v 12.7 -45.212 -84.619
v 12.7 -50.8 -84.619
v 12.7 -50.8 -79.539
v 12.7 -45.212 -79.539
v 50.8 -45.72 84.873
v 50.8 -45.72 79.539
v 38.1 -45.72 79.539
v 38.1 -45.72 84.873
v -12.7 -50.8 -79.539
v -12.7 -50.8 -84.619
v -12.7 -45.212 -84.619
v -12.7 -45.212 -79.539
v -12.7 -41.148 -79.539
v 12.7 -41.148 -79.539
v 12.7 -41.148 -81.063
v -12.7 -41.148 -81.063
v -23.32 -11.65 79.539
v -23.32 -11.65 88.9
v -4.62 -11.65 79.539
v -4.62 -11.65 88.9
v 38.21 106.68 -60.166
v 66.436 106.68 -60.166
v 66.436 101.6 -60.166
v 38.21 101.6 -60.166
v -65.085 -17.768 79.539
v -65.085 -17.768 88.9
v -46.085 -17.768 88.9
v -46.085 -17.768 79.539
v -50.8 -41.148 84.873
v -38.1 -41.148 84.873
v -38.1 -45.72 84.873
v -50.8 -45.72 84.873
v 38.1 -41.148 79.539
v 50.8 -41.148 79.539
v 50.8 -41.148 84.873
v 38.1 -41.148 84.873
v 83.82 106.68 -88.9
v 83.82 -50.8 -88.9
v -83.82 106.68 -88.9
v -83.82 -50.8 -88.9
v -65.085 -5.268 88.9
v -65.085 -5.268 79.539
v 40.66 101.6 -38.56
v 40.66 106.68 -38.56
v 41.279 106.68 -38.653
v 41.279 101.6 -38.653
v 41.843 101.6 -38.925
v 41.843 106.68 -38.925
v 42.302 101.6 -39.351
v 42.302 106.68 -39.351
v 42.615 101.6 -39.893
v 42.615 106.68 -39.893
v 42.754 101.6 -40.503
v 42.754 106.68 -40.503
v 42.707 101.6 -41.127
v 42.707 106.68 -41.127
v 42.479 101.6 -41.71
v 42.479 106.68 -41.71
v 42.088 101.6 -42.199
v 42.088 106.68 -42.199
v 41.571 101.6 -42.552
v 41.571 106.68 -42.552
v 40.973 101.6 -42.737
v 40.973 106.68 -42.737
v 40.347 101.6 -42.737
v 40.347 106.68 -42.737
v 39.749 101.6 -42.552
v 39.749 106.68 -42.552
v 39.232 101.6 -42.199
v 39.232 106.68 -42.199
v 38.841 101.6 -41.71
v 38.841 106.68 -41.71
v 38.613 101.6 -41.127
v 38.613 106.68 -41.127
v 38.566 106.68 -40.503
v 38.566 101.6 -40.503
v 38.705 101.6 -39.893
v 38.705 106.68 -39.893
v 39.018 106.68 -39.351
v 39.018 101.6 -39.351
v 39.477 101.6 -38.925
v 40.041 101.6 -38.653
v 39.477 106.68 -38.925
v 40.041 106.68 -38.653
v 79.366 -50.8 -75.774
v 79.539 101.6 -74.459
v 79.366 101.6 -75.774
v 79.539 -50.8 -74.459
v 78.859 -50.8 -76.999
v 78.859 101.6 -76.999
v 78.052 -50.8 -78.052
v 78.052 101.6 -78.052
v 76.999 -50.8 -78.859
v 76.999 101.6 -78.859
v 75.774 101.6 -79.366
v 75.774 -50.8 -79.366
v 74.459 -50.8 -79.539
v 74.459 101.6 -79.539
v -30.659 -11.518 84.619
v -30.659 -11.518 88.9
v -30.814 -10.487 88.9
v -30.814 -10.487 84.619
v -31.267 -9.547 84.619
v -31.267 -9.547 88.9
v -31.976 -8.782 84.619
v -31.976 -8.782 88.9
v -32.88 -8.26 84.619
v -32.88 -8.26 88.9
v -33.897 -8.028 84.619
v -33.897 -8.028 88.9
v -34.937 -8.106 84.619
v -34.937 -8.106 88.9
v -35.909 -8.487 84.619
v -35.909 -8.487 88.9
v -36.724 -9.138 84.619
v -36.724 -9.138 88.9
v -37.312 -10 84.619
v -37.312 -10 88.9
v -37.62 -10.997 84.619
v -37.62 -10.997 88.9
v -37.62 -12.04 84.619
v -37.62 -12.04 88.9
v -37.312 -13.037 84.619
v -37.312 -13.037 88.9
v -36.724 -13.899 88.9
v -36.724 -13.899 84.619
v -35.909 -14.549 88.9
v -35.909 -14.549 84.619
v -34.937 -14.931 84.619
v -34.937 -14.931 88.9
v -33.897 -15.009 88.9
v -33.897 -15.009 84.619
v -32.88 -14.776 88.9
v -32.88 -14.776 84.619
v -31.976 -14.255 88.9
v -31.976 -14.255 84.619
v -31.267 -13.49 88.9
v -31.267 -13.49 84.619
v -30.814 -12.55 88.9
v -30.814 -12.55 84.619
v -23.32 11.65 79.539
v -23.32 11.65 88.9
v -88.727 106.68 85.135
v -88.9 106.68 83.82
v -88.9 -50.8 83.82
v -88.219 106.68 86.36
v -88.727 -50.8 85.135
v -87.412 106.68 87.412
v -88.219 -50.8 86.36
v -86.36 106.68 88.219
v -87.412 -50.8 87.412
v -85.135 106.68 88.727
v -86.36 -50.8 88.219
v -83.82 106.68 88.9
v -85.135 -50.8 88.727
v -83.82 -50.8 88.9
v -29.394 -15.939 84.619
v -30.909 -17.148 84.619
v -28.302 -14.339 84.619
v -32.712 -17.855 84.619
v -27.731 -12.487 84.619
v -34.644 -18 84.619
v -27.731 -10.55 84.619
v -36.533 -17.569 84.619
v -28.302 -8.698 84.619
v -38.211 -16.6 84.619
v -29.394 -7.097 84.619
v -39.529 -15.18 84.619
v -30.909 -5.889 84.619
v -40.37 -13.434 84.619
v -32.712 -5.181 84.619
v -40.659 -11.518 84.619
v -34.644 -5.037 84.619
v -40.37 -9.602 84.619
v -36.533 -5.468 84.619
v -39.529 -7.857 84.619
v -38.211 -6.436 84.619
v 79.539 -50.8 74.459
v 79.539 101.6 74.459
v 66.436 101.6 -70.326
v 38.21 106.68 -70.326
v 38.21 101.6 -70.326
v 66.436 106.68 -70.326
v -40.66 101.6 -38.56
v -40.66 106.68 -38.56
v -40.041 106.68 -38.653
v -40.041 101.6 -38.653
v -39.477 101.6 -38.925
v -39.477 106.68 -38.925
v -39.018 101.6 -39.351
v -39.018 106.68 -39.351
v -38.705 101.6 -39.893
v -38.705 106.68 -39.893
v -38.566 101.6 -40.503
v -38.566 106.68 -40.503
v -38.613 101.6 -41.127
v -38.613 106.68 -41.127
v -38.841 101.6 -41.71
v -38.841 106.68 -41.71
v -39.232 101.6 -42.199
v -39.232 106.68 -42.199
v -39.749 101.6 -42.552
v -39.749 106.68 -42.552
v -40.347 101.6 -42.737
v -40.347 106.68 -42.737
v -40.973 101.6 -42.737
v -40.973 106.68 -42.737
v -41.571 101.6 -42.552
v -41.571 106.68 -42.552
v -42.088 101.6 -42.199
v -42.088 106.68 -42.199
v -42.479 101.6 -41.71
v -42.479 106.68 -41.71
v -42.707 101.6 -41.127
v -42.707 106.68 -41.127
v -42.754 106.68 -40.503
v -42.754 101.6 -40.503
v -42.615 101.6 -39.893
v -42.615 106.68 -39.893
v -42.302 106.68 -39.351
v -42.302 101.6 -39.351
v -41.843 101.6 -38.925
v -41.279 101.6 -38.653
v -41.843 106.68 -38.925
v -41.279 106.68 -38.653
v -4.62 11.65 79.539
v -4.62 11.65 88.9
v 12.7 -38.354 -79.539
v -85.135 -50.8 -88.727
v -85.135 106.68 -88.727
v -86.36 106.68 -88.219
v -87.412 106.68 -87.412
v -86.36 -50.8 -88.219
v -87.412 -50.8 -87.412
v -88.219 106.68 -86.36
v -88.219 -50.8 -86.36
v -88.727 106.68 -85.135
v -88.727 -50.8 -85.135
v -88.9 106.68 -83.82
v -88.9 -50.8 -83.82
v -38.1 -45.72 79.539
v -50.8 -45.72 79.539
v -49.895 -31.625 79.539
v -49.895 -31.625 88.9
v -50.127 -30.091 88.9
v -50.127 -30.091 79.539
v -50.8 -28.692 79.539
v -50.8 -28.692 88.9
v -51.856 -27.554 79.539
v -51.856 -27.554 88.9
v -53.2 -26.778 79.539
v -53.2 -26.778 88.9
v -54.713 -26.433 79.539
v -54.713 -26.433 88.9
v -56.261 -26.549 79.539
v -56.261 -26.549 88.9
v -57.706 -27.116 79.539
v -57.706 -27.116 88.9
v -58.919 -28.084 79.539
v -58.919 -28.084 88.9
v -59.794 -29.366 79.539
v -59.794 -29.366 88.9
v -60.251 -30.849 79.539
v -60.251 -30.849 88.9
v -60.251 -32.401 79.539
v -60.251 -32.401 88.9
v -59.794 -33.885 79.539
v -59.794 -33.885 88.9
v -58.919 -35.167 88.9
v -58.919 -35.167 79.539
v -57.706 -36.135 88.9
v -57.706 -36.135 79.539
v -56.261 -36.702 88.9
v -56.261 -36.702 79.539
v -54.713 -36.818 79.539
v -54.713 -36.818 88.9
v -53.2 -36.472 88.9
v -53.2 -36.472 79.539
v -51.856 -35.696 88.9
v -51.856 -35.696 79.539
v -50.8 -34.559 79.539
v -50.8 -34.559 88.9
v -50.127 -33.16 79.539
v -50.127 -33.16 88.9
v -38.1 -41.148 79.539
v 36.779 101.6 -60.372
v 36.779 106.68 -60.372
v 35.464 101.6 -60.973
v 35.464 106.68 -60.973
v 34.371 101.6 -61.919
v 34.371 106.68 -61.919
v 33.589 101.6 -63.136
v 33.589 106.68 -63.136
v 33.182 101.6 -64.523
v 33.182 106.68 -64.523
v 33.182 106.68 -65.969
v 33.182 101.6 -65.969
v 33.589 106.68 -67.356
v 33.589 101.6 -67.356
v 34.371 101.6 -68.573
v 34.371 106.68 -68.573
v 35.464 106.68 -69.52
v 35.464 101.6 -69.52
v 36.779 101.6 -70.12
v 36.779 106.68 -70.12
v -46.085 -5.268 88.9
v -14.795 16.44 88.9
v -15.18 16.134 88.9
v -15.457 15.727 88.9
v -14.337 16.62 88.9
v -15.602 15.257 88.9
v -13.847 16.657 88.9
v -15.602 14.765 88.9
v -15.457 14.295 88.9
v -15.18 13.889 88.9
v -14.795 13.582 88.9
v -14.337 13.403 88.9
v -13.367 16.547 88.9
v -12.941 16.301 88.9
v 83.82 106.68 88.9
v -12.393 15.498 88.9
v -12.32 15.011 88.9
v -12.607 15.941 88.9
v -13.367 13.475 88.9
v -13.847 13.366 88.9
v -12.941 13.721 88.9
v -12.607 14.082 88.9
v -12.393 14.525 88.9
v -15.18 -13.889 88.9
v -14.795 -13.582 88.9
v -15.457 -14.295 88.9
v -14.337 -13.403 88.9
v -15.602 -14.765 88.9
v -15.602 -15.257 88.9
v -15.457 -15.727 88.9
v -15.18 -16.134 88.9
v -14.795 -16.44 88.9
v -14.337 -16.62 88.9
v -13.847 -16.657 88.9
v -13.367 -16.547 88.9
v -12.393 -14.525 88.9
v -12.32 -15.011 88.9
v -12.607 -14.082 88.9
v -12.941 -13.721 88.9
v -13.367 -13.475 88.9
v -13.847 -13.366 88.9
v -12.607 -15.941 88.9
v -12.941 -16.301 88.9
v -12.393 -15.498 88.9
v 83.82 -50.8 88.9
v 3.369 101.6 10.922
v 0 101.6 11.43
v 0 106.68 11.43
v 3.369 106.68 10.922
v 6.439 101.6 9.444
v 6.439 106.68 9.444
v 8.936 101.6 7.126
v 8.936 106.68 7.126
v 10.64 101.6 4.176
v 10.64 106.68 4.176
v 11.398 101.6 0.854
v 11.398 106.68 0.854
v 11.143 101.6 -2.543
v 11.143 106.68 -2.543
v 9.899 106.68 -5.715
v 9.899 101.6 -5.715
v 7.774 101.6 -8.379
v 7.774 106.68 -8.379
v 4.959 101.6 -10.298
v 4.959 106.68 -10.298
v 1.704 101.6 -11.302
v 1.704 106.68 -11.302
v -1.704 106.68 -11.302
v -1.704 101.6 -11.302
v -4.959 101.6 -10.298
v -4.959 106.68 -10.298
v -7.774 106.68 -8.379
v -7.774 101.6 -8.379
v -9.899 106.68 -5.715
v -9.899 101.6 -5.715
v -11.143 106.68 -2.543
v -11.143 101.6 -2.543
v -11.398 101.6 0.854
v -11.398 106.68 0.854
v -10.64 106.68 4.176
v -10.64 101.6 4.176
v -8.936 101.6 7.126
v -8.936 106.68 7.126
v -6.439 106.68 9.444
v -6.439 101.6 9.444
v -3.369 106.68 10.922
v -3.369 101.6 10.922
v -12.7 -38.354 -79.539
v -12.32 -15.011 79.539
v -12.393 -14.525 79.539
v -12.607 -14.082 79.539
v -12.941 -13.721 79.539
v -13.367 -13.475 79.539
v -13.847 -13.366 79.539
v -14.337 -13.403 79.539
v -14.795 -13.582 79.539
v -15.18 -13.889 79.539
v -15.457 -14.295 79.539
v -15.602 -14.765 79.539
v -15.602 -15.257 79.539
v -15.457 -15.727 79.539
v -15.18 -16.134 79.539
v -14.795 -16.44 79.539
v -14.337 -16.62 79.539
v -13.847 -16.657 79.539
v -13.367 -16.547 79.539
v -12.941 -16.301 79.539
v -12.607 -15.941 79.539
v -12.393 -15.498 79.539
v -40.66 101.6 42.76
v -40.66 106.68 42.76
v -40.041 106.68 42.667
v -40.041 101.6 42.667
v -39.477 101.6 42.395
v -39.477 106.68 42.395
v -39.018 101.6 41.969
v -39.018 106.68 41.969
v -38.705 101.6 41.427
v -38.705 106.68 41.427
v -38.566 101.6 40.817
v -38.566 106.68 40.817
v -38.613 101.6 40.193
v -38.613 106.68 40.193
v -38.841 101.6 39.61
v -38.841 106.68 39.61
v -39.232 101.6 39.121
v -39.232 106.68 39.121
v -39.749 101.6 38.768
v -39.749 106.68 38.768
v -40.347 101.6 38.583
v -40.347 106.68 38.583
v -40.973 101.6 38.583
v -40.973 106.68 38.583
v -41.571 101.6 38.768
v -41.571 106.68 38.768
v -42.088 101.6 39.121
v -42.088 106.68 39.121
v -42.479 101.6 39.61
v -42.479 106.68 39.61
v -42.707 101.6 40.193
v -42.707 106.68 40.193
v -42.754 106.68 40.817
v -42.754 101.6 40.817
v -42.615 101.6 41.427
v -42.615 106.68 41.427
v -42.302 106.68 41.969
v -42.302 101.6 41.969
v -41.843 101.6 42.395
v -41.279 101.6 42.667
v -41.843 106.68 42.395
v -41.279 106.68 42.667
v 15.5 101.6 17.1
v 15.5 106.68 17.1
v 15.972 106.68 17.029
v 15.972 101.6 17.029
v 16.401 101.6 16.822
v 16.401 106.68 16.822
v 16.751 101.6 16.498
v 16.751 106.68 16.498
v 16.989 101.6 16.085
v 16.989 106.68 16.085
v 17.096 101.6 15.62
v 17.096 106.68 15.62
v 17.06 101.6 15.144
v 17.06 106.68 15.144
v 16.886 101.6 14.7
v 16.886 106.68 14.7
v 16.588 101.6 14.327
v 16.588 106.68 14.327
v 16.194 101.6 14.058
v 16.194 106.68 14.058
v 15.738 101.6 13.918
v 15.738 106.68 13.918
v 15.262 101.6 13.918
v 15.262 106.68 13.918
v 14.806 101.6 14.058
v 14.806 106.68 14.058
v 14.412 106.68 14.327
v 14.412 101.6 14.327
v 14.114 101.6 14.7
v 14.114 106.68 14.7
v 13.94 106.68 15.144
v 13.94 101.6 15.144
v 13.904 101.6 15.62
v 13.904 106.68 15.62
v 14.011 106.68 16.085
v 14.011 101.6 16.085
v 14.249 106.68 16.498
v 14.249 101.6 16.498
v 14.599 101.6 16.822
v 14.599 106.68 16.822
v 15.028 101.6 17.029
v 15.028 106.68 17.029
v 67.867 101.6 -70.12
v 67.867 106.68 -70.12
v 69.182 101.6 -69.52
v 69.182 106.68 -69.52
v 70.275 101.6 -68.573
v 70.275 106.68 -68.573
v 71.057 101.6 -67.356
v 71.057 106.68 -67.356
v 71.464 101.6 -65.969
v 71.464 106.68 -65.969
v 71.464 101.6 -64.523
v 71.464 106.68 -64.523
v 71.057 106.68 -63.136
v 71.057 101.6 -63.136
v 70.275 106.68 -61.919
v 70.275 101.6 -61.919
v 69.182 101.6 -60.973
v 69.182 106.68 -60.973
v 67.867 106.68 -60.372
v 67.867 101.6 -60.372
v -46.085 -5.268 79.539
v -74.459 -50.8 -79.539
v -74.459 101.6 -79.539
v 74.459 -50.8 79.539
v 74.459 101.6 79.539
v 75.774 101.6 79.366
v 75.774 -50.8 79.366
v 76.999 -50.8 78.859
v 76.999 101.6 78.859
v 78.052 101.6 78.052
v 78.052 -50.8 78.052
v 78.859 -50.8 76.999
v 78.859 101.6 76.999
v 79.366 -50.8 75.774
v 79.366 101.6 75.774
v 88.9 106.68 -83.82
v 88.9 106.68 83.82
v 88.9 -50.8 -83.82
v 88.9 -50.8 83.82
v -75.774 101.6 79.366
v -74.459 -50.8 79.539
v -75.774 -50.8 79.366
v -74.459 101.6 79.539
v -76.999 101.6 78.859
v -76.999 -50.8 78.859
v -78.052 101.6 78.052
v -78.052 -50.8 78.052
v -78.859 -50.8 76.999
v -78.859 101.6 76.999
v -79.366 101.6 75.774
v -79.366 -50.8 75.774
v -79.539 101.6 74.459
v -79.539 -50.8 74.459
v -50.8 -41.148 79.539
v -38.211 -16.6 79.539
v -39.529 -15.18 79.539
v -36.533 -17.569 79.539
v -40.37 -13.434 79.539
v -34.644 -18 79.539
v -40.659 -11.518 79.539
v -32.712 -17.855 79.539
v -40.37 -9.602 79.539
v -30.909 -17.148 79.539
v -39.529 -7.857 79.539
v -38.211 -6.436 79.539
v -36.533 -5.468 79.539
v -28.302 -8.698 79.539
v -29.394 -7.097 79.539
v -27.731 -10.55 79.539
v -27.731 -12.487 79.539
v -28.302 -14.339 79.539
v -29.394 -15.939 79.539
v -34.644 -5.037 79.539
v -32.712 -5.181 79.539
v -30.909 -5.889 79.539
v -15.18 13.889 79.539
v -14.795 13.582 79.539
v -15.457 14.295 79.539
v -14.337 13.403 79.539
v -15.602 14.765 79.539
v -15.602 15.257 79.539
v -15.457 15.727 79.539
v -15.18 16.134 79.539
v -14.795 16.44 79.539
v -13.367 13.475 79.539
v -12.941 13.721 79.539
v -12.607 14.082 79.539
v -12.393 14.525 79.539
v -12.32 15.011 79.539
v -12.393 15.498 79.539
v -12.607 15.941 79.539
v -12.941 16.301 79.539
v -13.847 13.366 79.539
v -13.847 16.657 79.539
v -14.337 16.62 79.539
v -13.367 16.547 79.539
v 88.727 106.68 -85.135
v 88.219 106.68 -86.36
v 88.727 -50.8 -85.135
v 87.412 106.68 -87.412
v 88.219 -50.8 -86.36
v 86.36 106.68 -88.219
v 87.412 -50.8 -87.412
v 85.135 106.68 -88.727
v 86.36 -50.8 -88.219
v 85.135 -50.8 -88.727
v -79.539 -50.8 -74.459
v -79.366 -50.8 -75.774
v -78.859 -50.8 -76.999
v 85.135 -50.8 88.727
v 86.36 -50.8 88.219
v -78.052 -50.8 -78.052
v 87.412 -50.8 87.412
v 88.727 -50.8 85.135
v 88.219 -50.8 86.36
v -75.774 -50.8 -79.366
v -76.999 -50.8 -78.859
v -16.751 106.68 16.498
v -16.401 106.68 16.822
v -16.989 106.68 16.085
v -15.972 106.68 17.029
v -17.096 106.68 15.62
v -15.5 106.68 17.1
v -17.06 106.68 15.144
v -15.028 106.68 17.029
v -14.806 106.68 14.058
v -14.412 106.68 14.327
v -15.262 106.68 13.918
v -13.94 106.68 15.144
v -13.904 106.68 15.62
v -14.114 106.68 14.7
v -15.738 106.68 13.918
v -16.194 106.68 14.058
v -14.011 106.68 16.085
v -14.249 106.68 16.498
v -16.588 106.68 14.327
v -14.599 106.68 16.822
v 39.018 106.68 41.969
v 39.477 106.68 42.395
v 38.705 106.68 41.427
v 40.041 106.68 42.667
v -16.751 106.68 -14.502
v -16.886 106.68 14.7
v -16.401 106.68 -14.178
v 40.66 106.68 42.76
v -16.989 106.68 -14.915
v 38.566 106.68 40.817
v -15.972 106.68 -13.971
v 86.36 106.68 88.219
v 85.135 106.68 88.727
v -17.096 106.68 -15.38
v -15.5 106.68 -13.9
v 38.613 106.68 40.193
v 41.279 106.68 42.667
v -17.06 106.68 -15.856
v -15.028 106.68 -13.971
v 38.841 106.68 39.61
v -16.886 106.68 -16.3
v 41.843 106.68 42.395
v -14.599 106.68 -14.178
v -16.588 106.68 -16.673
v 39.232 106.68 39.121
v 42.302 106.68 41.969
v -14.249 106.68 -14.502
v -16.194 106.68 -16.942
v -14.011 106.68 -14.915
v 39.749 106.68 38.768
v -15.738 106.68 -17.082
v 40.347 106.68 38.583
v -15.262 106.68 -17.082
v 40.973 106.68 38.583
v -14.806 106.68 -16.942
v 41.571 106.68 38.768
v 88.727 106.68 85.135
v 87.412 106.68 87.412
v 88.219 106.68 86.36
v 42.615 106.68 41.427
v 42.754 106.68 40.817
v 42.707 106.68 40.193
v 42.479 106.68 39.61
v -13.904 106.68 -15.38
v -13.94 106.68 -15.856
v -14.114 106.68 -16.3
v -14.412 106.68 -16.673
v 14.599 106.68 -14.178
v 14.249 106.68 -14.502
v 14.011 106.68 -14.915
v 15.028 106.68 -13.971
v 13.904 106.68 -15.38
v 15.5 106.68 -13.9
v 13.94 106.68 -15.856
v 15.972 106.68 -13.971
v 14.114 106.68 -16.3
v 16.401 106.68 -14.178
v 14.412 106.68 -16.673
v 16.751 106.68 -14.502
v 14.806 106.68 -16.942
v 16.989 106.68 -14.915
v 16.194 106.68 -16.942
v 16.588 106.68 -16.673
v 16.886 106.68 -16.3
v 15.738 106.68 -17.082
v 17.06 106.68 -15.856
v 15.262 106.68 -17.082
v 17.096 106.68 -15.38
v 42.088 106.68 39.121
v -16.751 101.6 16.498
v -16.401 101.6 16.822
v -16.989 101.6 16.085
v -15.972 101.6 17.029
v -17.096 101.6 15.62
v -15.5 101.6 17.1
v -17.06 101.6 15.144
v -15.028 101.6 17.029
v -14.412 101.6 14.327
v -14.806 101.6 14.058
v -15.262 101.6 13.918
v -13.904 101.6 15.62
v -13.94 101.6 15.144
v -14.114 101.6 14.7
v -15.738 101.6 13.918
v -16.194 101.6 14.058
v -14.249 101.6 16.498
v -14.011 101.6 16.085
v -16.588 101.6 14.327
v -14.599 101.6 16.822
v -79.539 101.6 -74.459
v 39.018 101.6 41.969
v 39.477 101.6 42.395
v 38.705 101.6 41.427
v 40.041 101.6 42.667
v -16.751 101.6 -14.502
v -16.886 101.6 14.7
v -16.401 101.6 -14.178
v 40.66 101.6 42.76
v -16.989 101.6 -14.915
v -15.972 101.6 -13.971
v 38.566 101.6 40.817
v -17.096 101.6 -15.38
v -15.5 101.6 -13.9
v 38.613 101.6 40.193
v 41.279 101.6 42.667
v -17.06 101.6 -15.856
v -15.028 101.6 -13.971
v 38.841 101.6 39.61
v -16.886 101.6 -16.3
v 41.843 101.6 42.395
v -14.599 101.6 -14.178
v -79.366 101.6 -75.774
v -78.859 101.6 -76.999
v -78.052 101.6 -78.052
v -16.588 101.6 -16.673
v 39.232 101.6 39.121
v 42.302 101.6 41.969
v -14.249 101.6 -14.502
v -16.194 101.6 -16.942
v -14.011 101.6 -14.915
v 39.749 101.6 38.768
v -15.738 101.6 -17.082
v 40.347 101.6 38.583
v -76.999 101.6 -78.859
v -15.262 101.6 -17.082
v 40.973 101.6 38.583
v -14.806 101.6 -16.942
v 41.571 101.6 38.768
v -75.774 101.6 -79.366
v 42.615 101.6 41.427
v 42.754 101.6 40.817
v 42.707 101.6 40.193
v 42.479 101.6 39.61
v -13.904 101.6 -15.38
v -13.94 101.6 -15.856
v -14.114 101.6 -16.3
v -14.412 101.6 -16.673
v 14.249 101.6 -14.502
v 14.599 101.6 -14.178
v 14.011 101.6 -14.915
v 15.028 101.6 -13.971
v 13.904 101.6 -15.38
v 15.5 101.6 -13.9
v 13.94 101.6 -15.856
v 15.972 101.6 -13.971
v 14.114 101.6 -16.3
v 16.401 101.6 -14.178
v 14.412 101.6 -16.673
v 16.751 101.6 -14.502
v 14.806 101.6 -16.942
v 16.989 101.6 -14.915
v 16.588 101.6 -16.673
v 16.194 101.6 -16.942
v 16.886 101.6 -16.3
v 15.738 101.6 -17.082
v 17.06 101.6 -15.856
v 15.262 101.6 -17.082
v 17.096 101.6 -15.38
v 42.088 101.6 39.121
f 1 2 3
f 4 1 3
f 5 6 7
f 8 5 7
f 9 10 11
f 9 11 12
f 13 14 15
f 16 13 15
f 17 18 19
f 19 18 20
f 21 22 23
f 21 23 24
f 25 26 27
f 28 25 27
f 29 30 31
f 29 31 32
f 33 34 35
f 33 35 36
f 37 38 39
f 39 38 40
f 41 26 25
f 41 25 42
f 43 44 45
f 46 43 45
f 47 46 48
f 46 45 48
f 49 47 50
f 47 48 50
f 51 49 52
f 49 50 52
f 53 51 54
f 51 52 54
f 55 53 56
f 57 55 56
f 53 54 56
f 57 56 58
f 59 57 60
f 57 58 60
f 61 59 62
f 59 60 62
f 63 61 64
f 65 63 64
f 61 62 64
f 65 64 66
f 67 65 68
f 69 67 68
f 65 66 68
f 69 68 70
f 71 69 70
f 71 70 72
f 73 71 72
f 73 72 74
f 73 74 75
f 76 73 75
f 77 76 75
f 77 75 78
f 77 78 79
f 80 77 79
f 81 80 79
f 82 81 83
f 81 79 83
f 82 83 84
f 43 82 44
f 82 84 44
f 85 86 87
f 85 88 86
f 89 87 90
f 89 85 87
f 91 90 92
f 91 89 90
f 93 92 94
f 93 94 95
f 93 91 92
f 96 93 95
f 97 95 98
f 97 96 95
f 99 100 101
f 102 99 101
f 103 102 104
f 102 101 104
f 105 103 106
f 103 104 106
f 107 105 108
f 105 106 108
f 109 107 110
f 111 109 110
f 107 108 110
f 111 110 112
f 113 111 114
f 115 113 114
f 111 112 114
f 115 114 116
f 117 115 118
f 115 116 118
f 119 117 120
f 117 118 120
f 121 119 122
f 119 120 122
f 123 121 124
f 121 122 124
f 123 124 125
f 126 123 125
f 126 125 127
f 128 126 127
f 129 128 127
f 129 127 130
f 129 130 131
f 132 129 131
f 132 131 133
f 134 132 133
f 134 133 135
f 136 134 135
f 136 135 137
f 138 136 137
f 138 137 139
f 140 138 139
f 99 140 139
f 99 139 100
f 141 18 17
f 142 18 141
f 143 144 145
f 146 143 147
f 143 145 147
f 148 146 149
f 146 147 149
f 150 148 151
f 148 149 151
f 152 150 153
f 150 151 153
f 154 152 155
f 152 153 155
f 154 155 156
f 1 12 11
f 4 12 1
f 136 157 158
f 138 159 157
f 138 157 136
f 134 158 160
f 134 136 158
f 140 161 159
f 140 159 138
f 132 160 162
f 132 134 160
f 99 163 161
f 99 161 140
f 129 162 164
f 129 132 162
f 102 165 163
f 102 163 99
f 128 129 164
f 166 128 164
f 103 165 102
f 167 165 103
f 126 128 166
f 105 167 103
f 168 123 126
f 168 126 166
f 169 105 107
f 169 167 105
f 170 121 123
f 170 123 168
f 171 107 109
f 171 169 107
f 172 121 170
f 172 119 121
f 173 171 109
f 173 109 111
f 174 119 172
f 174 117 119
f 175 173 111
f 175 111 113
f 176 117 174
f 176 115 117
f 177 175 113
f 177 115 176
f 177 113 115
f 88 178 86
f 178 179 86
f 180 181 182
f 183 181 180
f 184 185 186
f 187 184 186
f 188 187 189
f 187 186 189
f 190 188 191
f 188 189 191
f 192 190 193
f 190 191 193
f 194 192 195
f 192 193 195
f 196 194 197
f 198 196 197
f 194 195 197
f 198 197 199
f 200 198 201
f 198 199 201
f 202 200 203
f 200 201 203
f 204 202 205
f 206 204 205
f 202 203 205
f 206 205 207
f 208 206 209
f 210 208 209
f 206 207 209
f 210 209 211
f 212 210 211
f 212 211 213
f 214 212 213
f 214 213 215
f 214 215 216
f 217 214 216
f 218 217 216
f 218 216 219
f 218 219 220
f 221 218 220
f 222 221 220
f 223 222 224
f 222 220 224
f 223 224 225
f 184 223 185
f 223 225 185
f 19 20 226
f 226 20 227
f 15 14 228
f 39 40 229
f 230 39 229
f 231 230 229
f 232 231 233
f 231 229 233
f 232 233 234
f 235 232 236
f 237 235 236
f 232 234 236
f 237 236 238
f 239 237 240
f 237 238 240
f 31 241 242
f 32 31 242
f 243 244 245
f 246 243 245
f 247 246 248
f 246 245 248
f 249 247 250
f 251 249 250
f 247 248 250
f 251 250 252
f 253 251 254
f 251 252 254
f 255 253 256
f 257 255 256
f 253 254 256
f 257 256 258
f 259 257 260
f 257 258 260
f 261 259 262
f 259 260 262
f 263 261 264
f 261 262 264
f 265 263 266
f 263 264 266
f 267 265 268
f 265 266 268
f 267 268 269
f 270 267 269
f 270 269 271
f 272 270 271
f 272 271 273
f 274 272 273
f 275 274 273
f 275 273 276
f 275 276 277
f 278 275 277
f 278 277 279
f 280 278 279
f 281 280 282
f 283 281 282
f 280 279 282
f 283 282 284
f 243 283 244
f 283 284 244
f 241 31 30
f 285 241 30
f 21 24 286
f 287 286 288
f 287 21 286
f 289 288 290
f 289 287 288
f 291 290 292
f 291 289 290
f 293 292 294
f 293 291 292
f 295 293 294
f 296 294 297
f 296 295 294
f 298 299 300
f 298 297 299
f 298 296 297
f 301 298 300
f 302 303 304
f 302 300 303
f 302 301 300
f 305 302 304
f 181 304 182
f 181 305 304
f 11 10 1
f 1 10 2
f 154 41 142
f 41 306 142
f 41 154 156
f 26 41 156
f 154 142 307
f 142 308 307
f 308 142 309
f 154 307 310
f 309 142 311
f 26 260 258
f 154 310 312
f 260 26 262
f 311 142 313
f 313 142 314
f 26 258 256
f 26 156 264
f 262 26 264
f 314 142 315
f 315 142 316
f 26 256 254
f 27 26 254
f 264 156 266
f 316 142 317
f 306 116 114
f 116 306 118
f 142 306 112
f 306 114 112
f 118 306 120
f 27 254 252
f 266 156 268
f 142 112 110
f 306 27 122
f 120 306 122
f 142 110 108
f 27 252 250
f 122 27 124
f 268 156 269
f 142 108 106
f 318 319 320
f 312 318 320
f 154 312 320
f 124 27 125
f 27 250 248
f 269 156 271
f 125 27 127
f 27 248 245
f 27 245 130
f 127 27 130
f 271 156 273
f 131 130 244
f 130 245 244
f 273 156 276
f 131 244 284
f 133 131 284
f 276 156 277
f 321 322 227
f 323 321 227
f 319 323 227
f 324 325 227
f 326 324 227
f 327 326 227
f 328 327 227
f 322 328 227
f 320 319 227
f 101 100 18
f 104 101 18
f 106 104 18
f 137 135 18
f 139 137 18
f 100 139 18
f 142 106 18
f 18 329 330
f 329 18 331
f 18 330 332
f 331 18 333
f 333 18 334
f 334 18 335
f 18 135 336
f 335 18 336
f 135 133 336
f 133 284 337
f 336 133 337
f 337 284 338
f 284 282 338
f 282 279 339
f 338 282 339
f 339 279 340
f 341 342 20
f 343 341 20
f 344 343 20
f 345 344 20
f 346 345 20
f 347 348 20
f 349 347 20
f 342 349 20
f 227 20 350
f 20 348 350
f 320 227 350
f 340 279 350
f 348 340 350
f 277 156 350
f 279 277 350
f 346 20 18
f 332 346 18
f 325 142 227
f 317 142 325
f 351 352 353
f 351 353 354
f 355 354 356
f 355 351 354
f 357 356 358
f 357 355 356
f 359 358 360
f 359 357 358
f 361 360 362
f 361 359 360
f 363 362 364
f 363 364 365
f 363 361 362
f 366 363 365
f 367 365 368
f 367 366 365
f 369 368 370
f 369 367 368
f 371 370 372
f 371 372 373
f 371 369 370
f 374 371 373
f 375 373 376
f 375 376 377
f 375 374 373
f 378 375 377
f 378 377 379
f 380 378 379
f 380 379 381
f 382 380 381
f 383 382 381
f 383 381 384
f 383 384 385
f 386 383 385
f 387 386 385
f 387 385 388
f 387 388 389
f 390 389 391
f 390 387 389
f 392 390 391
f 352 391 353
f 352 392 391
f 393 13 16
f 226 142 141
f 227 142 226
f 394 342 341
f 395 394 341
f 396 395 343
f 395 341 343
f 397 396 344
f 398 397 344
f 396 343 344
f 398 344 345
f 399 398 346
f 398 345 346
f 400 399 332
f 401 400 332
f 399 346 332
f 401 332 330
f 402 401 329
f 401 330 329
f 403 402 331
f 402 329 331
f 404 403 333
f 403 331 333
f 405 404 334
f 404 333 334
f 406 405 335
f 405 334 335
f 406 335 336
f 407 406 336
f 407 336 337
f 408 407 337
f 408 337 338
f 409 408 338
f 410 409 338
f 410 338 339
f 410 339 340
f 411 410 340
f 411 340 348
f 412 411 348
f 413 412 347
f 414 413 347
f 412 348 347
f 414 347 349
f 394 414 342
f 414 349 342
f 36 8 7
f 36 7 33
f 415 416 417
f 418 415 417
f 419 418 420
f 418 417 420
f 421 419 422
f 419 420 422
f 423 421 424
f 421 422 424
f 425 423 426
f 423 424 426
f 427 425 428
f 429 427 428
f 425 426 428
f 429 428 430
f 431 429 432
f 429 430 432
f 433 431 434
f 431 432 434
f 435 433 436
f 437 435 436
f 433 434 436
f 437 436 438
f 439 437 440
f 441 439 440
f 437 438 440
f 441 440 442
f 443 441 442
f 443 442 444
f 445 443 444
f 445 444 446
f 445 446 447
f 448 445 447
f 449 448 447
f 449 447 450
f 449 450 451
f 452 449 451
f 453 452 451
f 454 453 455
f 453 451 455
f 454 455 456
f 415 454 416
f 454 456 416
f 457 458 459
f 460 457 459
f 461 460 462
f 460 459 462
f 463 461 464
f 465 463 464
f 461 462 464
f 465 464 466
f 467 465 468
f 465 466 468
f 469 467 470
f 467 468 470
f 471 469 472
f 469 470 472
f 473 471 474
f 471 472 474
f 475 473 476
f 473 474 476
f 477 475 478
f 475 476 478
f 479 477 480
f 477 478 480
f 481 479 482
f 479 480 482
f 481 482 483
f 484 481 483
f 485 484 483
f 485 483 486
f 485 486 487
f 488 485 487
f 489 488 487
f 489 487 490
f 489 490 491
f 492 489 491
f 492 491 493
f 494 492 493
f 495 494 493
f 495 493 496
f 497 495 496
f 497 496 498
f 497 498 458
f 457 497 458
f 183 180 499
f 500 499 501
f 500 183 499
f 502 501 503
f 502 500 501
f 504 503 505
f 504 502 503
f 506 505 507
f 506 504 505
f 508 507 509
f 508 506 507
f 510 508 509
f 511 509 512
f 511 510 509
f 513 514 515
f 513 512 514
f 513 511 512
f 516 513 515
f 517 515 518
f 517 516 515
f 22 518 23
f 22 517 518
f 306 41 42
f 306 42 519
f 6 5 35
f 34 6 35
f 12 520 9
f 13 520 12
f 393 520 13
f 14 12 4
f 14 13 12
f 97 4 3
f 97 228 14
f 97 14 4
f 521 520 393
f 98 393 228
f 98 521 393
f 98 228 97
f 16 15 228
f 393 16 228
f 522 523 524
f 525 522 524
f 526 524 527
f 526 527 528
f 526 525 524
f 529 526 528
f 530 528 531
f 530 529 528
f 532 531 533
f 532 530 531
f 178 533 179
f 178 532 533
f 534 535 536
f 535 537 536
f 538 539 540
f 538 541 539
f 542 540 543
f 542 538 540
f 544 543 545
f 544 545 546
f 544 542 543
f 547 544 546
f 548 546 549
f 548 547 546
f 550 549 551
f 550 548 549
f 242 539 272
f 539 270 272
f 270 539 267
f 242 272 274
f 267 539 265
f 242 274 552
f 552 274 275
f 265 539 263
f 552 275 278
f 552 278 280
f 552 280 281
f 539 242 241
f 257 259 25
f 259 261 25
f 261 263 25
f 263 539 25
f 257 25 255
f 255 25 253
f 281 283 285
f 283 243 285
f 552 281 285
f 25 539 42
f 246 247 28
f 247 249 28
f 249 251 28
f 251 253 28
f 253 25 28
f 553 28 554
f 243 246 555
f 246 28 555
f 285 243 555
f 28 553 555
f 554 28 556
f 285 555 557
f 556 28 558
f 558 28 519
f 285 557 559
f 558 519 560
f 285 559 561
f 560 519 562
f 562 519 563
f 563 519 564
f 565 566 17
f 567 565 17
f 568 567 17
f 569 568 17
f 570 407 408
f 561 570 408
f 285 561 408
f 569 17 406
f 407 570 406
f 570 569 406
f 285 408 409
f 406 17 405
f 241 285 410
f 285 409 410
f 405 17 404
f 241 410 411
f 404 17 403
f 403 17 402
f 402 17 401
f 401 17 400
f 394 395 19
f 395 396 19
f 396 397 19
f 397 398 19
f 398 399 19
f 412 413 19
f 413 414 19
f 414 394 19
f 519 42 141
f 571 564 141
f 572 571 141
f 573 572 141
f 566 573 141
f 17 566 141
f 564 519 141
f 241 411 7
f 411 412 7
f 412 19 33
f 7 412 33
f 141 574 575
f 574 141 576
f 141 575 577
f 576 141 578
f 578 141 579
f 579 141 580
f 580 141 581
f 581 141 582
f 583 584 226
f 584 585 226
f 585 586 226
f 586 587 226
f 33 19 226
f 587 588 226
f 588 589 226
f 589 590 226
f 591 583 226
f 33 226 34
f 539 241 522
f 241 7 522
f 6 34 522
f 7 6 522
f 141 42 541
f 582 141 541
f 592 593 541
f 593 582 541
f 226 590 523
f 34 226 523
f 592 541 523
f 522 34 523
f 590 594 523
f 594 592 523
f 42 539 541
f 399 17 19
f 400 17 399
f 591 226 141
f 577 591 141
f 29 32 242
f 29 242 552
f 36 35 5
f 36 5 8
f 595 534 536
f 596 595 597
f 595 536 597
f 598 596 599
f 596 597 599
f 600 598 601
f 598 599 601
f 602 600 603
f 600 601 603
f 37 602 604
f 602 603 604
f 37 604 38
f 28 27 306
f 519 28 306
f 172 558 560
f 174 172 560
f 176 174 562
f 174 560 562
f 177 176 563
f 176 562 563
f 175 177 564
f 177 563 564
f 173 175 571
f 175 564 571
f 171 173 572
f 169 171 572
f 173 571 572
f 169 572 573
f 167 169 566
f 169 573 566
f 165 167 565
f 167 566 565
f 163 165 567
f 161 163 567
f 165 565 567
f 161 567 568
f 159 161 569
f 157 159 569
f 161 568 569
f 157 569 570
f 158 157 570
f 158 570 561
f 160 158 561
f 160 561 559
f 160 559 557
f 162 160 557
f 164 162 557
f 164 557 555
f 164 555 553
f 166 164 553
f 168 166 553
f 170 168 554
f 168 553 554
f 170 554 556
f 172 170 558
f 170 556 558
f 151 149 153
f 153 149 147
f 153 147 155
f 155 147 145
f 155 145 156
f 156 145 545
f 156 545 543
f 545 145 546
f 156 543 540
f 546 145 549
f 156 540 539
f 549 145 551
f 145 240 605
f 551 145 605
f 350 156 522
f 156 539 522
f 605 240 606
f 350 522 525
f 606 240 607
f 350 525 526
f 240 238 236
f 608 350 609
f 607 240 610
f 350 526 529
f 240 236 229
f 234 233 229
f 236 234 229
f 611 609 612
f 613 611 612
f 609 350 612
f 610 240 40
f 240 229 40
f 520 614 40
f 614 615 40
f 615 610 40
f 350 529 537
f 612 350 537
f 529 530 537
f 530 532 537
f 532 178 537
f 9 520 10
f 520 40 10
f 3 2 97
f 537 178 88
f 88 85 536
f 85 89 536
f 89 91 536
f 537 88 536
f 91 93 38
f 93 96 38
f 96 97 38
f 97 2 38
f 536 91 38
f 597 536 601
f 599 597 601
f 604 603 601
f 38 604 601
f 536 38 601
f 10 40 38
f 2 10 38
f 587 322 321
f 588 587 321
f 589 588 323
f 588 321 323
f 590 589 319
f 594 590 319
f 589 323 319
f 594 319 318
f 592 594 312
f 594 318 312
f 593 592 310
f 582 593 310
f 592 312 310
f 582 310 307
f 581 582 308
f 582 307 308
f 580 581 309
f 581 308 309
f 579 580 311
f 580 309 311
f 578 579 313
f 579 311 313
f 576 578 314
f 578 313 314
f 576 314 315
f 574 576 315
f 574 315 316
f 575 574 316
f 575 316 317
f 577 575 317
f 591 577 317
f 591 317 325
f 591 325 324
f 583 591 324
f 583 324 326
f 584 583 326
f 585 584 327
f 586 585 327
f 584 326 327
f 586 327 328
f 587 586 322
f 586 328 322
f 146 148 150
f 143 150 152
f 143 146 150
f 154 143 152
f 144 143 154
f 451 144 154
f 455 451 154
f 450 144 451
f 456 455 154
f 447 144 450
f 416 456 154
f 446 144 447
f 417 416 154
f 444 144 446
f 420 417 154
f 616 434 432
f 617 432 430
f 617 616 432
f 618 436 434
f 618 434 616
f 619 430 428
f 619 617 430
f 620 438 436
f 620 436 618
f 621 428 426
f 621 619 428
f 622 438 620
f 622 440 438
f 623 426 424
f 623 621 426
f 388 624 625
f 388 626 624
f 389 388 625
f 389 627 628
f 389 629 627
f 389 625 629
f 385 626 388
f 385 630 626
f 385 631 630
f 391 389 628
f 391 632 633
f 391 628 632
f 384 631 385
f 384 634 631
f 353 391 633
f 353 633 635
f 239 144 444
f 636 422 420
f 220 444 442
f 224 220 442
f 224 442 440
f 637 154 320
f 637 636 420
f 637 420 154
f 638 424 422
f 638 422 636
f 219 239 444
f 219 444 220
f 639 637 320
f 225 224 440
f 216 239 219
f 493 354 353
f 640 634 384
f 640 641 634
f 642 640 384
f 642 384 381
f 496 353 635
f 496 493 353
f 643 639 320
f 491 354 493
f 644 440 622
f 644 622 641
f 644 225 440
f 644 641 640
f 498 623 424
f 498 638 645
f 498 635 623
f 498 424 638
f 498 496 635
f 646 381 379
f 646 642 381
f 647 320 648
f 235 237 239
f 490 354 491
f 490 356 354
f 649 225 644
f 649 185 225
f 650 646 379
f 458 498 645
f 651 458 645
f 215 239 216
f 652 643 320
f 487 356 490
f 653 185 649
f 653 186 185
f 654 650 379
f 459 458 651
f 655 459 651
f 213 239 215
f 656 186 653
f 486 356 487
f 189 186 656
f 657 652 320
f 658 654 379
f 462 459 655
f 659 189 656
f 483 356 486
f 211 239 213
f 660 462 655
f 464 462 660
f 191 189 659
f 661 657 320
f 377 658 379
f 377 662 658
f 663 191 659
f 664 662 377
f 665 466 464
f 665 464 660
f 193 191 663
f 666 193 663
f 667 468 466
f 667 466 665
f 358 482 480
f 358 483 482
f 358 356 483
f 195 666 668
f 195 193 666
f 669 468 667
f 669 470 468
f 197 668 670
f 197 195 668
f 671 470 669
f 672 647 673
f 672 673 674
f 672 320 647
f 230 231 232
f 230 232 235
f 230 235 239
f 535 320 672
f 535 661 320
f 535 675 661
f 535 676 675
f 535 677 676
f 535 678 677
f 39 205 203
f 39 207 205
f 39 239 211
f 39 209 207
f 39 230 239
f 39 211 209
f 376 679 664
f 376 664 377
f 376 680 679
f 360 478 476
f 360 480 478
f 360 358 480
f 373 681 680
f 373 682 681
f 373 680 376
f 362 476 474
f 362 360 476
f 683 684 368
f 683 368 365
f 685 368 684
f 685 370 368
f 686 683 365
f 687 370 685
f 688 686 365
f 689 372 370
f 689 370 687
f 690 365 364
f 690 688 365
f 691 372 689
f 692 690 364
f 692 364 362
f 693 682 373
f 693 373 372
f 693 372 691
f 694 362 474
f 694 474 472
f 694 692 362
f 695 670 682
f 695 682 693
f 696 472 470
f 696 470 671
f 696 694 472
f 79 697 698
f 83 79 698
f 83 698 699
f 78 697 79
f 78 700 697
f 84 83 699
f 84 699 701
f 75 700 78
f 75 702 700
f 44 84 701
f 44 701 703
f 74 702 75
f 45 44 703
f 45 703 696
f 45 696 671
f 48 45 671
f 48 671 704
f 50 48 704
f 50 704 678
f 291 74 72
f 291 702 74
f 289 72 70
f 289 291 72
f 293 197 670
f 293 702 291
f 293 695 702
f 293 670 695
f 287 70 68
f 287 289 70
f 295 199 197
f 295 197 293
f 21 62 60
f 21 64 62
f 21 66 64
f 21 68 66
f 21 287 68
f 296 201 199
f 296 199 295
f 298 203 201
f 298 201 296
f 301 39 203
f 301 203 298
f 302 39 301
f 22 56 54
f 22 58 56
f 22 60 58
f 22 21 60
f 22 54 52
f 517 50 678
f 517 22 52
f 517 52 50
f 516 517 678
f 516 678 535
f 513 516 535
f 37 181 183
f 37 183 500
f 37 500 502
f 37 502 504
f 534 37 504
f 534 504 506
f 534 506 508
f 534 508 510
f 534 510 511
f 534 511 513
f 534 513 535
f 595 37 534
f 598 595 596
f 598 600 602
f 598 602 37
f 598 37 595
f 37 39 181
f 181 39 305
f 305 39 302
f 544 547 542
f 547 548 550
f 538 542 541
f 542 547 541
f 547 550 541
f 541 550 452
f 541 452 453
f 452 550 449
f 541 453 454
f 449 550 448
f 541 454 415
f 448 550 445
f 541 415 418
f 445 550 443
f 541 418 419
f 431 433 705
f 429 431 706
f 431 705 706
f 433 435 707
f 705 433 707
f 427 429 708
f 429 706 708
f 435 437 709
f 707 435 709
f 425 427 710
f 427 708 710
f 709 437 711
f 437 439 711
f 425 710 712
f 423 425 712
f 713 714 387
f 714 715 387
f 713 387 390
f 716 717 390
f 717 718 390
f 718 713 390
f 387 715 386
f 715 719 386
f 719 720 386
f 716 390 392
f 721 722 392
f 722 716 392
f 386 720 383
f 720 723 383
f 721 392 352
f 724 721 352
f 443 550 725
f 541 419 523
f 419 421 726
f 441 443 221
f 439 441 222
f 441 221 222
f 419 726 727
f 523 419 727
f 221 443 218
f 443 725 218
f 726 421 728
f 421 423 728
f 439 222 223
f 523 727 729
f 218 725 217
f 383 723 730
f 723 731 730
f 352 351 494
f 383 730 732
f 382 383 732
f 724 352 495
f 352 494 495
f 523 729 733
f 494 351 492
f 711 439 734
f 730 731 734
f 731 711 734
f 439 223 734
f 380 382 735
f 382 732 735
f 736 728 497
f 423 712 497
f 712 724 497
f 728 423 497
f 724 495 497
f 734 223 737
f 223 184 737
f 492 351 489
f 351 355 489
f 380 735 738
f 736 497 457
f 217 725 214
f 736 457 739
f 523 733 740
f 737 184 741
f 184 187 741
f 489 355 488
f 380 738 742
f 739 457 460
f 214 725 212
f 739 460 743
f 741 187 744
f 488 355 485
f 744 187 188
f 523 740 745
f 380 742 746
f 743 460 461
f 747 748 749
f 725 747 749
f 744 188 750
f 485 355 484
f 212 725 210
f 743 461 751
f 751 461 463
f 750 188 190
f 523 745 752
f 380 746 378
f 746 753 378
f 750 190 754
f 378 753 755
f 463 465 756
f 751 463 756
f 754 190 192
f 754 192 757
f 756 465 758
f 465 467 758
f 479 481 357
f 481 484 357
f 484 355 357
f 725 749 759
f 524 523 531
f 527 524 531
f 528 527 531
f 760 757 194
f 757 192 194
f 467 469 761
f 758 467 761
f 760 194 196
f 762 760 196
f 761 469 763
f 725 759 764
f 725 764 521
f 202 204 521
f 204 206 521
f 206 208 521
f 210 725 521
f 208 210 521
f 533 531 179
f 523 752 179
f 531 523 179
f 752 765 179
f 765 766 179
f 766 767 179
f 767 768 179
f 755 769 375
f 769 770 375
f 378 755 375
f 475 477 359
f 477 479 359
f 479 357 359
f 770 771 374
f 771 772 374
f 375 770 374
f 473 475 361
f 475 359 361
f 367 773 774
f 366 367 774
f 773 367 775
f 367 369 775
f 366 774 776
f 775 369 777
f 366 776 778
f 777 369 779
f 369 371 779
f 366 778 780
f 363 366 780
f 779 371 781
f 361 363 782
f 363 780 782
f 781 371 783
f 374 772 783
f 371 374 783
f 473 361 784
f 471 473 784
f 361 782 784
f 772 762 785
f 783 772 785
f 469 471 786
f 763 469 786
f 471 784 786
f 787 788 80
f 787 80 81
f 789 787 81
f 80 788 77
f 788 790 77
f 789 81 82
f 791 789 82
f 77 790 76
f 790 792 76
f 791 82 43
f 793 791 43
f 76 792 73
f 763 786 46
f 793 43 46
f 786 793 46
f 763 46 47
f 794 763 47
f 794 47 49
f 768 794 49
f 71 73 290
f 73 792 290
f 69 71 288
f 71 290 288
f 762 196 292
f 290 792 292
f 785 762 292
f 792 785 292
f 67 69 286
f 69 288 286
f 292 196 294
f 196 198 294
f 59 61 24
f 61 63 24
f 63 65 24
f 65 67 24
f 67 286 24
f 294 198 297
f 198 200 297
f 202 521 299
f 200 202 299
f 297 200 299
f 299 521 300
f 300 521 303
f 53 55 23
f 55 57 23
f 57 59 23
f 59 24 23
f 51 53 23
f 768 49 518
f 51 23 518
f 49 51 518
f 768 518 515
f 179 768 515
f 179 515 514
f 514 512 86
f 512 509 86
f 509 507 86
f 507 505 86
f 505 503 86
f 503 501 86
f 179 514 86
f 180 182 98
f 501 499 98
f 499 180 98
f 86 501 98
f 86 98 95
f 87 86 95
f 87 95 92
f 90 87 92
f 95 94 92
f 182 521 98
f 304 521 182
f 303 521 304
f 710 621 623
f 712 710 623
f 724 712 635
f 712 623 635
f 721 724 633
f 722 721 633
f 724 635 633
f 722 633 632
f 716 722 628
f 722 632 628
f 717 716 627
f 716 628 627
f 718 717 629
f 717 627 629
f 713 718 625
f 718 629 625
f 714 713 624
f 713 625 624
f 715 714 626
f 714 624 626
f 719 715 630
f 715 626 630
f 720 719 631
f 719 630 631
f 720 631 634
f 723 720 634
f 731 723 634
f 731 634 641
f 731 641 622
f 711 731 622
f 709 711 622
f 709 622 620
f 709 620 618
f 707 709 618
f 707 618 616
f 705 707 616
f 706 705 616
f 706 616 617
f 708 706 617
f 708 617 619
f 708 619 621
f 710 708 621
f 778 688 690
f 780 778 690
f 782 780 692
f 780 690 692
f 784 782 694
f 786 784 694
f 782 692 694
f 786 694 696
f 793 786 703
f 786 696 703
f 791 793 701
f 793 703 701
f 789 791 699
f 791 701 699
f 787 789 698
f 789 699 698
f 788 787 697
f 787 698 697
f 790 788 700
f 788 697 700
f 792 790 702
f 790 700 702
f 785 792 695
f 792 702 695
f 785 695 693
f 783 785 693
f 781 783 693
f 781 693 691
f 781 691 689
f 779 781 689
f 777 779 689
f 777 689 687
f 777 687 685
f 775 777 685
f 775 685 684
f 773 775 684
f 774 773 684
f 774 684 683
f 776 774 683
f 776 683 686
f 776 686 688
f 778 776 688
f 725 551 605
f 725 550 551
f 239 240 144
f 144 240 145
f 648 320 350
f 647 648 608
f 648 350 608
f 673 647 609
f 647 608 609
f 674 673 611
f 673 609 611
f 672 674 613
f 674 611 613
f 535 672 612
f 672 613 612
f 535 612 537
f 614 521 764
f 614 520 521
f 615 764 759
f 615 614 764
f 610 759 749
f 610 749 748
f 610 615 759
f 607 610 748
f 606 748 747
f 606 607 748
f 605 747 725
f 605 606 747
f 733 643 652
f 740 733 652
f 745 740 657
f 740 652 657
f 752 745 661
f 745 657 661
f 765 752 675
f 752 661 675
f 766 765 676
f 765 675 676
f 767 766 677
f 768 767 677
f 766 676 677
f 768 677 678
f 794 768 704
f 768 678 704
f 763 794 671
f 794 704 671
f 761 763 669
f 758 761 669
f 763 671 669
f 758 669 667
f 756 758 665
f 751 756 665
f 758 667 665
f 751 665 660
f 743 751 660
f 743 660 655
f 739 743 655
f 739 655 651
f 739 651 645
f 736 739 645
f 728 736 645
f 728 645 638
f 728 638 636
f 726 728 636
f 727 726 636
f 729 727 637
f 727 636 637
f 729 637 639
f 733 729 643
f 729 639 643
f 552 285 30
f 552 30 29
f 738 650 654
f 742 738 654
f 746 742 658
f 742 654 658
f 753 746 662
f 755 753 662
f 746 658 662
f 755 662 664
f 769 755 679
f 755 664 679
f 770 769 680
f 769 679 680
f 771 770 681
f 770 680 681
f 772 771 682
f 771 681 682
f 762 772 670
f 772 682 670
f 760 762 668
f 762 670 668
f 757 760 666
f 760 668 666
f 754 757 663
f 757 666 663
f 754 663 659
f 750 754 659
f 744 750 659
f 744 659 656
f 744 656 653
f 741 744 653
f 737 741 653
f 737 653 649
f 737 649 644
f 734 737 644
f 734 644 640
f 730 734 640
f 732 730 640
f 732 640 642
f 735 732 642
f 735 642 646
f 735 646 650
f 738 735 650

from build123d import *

# Parameters (mm, degrees)
SKETCH1_W                = 159.078855478
SKETCH1_H                = 159.078855478
BOSS_EXTRUDE1_DEPTH      = 101.6
BOSS_EXTRUDE1_DEPTH_BACK = 50.8
BOSS_EXTRUDE3_START      = 101.6
SKETCH1_5_R              = 11.43
BOSS_EXTRUDE3_DEPTH      = 5.08
SKETCH3_R                = 1.6
CUT_EXTRUDE1_DEPTH       = 202.510224058
FILLET4_R                = 5.08
SKETCH4_R                = 2.1
CUT_EXTRUDE2_DEPTH       = 5.08
SKETCH5_R                = 3.5
SKETCH5_R_2              = 5.207
SKETCH5_R_3              = 1.65
SKETCH5_W                = 19
SKETCH5_H                = 12.5
SKETCH5_W_2              = 18.7
SKETCH5_H_2              = 23.3
CUT_EXTRUDE3_DEPTH       = 9.360572261
SKETCH7_W                = 25.4
SKETCH7_H                = 5.08
CUT_EXTRUDE4_DEPTH       = 5.588
BOSS_EXTRUDE4_DEPTH      = 25.4
CUT_EXTRUDE5_DEPTH       = 25.4
SKETCH11_W               = 12.7
SKETCH11_H               = 4.572
CUT_EXTRUDE6_DEPTH       = 5.334
CUT_EXTRUDE7_DEPTH       = 2.54
CUT_EXTRUDE8_DEPTH       = 16.764
SKETCH13_R               = 6.5
CUT_EXTRUDE9_DEPTH       = 5.08


with BuildPart() as part:
    # Sketch1 → Boss-Extrude1 (new, two sides)
    with BuildSketch(Plane(origin=(0, 0, 0), x_dir=(1, 0, 0), z_dir=(0, 1, 0))) as boss_extrude1_sk:
        with BuildLine():
            Line((-83.82, -88.9), (83.82, -88.9))
            ThreePointArc((83.82, -88.9), (87.412102448, -87.412102448), (88.9, -83.82))
            Line((88.9, -83.82), (88.9, 83.82))
            ThreePointArc((88.9, 83.82), (87.412102448, 87.412102448), (83.82, 88.9))
            Line((83.82, 88.9), (-83.82, 88.9))
            ThreePointArc((-83.82, 88.9), (-87.412102448, 87.412102448), (-88.9, 83.82))
            Line((-88.9, 83.82), (-88.9, -83.82))
            ThreePointArc((-88.9, -83.82), (-87.412102448, -87.412102448), (-83.82, -88.9))
        make_face()
        Rectangle(SKETCH1_W, SKETCH1_H, mode=Mode.SUBTRACT)
    extrude(amount=BOSS_EXTRUDE1_DEPTH)
    extrude(boss_extrude1_sk.sketch, amount=-BOSS_EXTRUDE1_DEPTH_BACK)

    # Sketch1<5> → Boss-Extrude3 (add)
    with BuildSketch(Plane(origin=(0, 0, 0), x_dir=(1, 0, 0), z_dir=(0, 1, 0)).offset(BOSS_EXTRUDE3_START)):
        with BuildLine():
            ThreePointArc((-88.9, -83.82), (-87.412102448, -87.412102448), (-83.82, -88.9))
            Line((-83.82, -88.9), (83.82, -88.9))
            ThreePointArc((83.82, -88.9), (87.412102448, -87.412102448), (88.9, -83.82))
            Line((88.9, -83.82), (88.9, 83.82))
            ThreePointArc((88.9, 83.82), (87.412102448, 87.412102448), (83.82, 88.9))
            Line((83.82, 88.9), (-83.82, 88.9))
            ThreePointArc((-83.82, 88.9), (-87.412102448, 87.412102448), (-88.9, 83.82))
            Line((-88.9, 83.82), (-88.9, -83.82))
        make_face()
        with Locations(Location((0, 0, 0), (0, 0, 270))):
            Circle(SKETCH1_5_R, mode=Mode.SUBTRACT)
    extrude(amount=BOSS_EXTRUDE3_DEPTH)

    # Sketch3 → Cut-Extrude1 (cut, through all)
    with BuildSketch(Plane(origin=(0, 106.68, 0), x_dir=(1, 0, 0), z_dir=(0, 1, 0))):
        with Locations(Location((-15.5, 15.5, 0), (0, 0, 270))):
            Circle(SKETCH3_R)
        with Locations(Location((-15.5, -15.5, 0), (0, 0, 270))):
            Circle(SKETCH3_R)
        with Locations(Location((15.5, 15.5, 0), (0, 0, 270))):
            Circle(SKETCH3_R)
        with Locations(Location((15.5, -15.5, 0), (0, 0, 270))):
            Circle(SKETCH3_R)
    extrude(amount=-CUT_EXTRUDE1_DEPTH, mode=Mode.SUBTRACT)

    # Fillet4
    fillet4_edges = [part.edges().sort_by_distance(p)[0] for p in [
        (79.539427739, 25.4, -79.539427739),
        (-79.539427739, 25.4, -79.539427739),
        (-79.539427739, 25.4, 79.539427739),
        (79.539427739, 25.4, 79.539427739),
    ]]
    fillet(fillet4_edges, radius=FILLET4_R)

    # Sketch4 → Cut-Extrude2 (cut)
    with BuildSketch(Plane(origin=(0, 106.68, 0), x_dir=(1, 0, 0), z_dir=(0, 1, 0))):
        with Locations(Location((-40.66, 40.66, 0), (0, 0, 270))):
            Circle(SKETCH4_R)
        with Locations(Location((40.66, 40.66, 0), (0, 0, 270))):
            Circle(SKETCH4_R)
        with Locations(Location((-40.66, -40.66, 0), (0, 0, 270))):
            Circle(SKETCH4_R)
        with Locations(Location((40.66, -40.66, 0), (0, 0, 270))):
            Circle(SKETCH4_R)
    extrude(amount=-CUT_EXTRUDE2_DEPTH, mode=Mode.SUBTRACT)

    # Sketch5 → Cut-Extrude3 (cut)
    with BuildSketch(Plane.XY.offset(88.9)):
        with Locations((-34.158642562, -11.51833892)):
            Circle(SKETCH5_R)
        with Locations((-55.102312512, -31.62532479)):
            Circle(SKETCH5_R_2)
        with Locations((-13.97, 15.0114)):
            Circle(SKETCH5_R_3)
        with Locations((-13.97, -15.0114)):
            Circle(SKETCH5_R_3)
        with Locations((-55.584910431, -11.51833892)):
            Rectangle(SKETCH5_W, SKETCH5_H)
        with Locations((-13.97, 0)):
            Rectangle(SKETCH5_W_2, SKETCH5_H_2)
    extrude(amount=-CUT_EXTRUDE3_DEPTH, mode=Mode.SUBTRACT)

    # Sketch7 → Cut-Extrude4 (cut)
    with BuildSketch(Plane.XZ.offset(50.8)):
        with Locations((0, -82.079427739)):
            Rectangle(SKETCH7_W, SKETCH7_H)
    extrude(amount=-CUT_EXTRUDE4_DEPTH, mode=Mode.SUBTRACT)

    # Sketch10 → Boss-Extrude4 (add)
    with BuildSketch(Plane.ZY.offset(-12.7)):
        Polygon((-79.539427739, -38.354), (-79.539427739, -41.148), (-81.063427739, -41.148), align=None)
    extrude(amount=BOSS_EXTRUDE4_DEPTH)

    # Sketch10<2> → Cut-Extrude5 (cut)
    with BuildSketch(Plane.ZY.offset(-12.7)):
        Polygon((-79.539427739, -38.354), (-79.539427739, -41.148), (-81.063427739, -41.148), align=None)
    extrude(amount=CUT_EXTRUDE5_DEPTH, mode=Mode.SUBTRACT)

    # Sketch11 → Cut-Extrude6 (cut)
    with BuildSketch(Plane(origin=(0, 0, 79.539427739), x_dir=(-1, 0, 0), z_dir=(0, 0, -1))):
        with Locations((-44.45, -43.434)):
            Rectangle(SKETCH11_W, SKETCH11_H)
        with Locations((44.45, -43.434)):
            Rectangle(SKETCH11_W, SKETCH11_H)
    extrude(amount=-CUT_EXTRUDE6_DEPTH, mode=Mode.SUBTRACT)

    # Sketch12 → Cut-Extrude7 (cut)
    with BuildSketch(Plane(origin=(0, 106.68, 0), x_dir=(1, 0, 0), z_dir=(0, 1, 0))):
        with BuildLine():
            Line((38.210330331, 70.326189438), (66.435994121, 70.326189438))
            ThreePointArc((66.435994121, 70.326189438), (71.515994121, 65.246189438), (66.435994121, 60.166189438))
            Line((66.435994121, 60.166189438), (38.210330331, 60.166189438))
            ThreePointArc((38.210330331, 60.166189438), (33.130330331, 65.246189438), (38.210330331, 70.326189438))
        make_face()
    extrude(amount=-CUT_EXTRUDE7_DEPTH, mode=Mode.SUBTRACT)

    # Sketch12<2> → Cut-Extrude8 (cut)
    with BuildSketch(Plane(origin=(0, 106.68, 0), x_dir=(1, 0, 0), z_dir=(0, 1, 0))):
        with BuildLine():
            Line((38.210330331, 70.326189438), (66.435994121, 70.326189438))
            ThreePointArc((66.435994121, 70.326189438), (71.515994121, 65.246189438), (66.435994121, 60.166189438))
            Line((66.435994121, 60.166189438), (38.210330331, 60.166189438))
            ThreePointArc((38.210330331, 60.166189438), (33.130330331, 65.246189438), (38.210330331, 70.326189438))
        make_face()
    extrude(amount=-CUT_EXTRUDE8_DEPTH, mode=Mode.SUBTRACT)

    # Sketch13 → Cut-Extrude9 (cut)
    with BuildSketch(Plane(origin=(0, 0, 79.539427739), x_dir=(-1, 0, 0), z_dir=(0, 0, -1))):
        with Locations((34.158642562, -11.51833892)):
            Circle(SKETCH13_R)
    extrude(amount=-CUT_EXTRUDE9_DEPTH, mode=Mode.SUBTRACT)


solid = part.part
